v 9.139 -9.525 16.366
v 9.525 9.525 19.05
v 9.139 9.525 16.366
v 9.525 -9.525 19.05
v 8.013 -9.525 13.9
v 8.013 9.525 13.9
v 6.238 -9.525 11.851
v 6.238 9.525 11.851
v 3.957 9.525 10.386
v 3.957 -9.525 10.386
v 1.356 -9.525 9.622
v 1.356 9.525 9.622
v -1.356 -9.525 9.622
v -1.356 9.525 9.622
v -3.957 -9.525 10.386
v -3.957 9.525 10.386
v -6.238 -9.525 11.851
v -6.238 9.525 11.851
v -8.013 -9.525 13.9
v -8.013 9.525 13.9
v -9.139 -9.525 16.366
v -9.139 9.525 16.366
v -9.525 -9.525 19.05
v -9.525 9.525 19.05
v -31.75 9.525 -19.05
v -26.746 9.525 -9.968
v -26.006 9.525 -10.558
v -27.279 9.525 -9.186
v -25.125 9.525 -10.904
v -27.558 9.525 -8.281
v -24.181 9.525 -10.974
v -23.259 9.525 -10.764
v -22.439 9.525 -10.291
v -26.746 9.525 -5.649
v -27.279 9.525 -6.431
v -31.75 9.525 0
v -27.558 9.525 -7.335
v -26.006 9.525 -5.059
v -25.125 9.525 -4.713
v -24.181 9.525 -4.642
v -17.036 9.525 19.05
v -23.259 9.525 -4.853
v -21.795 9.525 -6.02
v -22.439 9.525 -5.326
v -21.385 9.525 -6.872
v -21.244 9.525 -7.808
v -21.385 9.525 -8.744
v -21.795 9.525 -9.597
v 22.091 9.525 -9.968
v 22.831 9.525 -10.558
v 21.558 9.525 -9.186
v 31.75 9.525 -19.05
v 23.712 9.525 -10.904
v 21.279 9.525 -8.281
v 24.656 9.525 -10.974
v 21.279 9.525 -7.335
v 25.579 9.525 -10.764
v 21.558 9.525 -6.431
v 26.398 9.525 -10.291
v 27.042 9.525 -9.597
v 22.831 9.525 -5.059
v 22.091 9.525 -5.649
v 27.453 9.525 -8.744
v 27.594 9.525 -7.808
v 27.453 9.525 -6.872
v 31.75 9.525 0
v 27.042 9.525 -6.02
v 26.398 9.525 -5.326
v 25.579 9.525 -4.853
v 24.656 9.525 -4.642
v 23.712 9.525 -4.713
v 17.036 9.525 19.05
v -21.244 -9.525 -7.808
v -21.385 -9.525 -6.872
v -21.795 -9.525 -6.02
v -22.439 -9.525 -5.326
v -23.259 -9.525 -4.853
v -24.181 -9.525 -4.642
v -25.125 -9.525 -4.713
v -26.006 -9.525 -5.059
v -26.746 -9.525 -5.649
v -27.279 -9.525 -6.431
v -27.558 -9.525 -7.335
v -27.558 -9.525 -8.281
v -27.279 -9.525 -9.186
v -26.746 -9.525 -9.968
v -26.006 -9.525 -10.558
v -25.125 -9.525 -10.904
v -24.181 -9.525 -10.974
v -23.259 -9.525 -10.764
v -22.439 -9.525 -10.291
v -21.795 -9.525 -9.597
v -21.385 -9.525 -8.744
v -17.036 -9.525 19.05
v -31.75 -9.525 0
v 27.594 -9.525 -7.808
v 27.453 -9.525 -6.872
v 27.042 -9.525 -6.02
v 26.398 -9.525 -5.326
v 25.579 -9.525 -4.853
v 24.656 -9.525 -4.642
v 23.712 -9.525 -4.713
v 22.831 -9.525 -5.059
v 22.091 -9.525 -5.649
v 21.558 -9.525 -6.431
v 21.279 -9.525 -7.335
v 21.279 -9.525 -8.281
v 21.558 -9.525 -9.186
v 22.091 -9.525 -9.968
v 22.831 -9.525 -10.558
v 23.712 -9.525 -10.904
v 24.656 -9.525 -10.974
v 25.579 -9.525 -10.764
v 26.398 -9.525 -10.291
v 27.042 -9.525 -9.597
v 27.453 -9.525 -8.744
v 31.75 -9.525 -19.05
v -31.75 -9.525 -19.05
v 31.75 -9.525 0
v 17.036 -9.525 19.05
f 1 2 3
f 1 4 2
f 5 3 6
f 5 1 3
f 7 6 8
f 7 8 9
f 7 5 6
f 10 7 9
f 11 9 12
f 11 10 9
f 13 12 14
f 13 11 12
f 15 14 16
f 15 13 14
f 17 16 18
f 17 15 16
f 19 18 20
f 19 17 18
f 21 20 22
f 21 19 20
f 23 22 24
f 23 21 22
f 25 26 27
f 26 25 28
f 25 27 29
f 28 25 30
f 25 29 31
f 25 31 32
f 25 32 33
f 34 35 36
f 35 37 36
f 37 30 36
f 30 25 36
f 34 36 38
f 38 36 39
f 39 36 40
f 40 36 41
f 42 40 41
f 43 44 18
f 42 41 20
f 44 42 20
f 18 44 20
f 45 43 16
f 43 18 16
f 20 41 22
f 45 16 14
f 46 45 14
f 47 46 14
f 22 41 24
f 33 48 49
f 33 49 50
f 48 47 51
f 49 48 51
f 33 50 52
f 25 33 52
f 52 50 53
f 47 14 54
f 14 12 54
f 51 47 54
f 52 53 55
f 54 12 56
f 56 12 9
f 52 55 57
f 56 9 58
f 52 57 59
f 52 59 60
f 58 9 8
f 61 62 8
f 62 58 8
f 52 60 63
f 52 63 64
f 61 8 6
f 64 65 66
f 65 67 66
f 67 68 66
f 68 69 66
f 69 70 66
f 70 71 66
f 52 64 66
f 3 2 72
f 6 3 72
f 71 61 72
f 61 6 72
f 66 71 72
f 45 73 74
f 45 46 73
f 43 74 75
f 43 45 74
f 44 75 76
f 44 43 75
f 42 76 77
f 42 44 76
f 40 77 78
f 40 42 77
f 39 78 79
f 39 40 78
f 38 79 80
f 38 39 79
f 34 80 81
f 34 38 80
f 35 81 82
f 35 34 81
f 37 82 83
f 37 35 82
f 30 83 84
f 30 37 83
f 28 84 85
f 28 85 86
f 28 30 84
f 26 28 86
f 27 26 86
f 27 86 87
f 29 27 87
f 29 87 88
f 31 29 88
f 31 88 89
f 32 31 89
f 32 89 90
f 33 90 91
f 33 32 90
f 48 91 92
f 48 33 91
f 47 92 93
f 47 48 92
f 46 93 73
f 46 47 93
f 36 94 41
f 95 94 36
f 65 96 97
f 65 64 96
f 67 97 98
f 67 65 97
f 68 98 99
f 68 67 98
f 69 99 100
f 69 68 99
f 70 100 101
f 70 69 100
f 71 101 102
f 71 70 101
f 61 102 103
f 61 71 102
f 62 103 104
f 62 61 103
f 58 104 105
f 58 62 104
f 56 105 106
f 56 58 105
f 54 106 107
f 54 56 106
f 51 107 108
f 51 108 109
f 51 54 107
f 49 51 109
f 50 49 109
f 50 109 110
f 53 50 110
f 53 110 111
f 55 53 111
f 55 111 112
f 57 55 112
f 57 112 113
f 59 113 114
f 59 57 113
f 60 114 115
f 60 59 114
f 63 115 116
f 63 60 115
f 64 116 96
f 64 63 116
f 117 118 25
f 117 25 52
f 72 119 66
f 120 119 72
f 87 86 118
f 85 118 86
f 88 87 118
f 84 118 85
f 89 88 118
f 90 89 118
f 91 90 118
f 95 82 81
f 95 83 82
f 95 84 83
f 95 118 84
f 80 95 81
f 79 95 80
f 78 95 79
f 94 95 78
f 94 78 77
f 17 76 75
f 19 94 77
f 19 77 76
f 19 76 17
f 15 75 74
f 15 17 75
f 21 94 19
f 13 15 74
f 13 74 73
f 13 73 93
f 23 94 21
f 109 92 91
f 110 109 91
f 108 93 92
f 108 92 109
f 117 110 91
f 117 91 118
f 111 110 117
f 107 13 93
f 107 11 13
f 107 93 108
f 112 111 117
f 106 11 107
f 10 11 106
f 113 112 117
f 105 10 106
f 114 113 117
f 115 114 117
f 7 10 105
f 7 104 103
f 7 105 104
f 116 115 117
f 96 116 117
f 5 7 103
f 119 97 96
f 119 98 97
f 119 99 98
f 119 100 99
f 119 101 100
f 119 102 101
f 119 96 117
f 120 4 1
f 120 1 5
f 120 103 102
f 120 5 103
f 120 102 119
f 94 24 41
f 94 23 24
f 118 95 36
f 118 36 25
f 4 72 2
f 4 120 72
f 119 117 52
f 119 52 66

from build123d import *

# Parameters (mm, degrees)
F0_R     = 3.175
F1_DEPTH = 9.525


with BuildPart() as f1:
    # F0 (on Front) → F1 (new body, symmetric)
    with BuildSketch(Plane.XZ):
        with BuildLine():
            Line((-9.525, 19.05), (-17.036222, 19.05))
            Line((-17.036222, 19.05), (-31.75, 0))
            Line((-31.75, 0), (-31.75, -19.05))
            Line((-31.75, -19.05), (31.75, -19.05))
            Line((31.75, -19.05), (31.75, 0))
            Line((31.75, 0), (17.036222, 19.05))
            Line((17.036222, 19.05), (9.525, 19.05))
            ThreePointArc((9.525, 19.05), (0, 9.525), (-9.525, 19.05))
        make_face()
        with Locations((-24.418587, -7.808267)):
            Circle(F0_R, mode=Mode.SUBTRACT)
        with Locations((24.418587, -7.808267)):
            Circle(F0_R, mode=Mode.SUBTRACT)
    extrude(amount=F1_DEPTH, both=True)


with BuildPart() as f2_1:
    # F2: copy of F1
    add(f1.part)


solid = f1.part
